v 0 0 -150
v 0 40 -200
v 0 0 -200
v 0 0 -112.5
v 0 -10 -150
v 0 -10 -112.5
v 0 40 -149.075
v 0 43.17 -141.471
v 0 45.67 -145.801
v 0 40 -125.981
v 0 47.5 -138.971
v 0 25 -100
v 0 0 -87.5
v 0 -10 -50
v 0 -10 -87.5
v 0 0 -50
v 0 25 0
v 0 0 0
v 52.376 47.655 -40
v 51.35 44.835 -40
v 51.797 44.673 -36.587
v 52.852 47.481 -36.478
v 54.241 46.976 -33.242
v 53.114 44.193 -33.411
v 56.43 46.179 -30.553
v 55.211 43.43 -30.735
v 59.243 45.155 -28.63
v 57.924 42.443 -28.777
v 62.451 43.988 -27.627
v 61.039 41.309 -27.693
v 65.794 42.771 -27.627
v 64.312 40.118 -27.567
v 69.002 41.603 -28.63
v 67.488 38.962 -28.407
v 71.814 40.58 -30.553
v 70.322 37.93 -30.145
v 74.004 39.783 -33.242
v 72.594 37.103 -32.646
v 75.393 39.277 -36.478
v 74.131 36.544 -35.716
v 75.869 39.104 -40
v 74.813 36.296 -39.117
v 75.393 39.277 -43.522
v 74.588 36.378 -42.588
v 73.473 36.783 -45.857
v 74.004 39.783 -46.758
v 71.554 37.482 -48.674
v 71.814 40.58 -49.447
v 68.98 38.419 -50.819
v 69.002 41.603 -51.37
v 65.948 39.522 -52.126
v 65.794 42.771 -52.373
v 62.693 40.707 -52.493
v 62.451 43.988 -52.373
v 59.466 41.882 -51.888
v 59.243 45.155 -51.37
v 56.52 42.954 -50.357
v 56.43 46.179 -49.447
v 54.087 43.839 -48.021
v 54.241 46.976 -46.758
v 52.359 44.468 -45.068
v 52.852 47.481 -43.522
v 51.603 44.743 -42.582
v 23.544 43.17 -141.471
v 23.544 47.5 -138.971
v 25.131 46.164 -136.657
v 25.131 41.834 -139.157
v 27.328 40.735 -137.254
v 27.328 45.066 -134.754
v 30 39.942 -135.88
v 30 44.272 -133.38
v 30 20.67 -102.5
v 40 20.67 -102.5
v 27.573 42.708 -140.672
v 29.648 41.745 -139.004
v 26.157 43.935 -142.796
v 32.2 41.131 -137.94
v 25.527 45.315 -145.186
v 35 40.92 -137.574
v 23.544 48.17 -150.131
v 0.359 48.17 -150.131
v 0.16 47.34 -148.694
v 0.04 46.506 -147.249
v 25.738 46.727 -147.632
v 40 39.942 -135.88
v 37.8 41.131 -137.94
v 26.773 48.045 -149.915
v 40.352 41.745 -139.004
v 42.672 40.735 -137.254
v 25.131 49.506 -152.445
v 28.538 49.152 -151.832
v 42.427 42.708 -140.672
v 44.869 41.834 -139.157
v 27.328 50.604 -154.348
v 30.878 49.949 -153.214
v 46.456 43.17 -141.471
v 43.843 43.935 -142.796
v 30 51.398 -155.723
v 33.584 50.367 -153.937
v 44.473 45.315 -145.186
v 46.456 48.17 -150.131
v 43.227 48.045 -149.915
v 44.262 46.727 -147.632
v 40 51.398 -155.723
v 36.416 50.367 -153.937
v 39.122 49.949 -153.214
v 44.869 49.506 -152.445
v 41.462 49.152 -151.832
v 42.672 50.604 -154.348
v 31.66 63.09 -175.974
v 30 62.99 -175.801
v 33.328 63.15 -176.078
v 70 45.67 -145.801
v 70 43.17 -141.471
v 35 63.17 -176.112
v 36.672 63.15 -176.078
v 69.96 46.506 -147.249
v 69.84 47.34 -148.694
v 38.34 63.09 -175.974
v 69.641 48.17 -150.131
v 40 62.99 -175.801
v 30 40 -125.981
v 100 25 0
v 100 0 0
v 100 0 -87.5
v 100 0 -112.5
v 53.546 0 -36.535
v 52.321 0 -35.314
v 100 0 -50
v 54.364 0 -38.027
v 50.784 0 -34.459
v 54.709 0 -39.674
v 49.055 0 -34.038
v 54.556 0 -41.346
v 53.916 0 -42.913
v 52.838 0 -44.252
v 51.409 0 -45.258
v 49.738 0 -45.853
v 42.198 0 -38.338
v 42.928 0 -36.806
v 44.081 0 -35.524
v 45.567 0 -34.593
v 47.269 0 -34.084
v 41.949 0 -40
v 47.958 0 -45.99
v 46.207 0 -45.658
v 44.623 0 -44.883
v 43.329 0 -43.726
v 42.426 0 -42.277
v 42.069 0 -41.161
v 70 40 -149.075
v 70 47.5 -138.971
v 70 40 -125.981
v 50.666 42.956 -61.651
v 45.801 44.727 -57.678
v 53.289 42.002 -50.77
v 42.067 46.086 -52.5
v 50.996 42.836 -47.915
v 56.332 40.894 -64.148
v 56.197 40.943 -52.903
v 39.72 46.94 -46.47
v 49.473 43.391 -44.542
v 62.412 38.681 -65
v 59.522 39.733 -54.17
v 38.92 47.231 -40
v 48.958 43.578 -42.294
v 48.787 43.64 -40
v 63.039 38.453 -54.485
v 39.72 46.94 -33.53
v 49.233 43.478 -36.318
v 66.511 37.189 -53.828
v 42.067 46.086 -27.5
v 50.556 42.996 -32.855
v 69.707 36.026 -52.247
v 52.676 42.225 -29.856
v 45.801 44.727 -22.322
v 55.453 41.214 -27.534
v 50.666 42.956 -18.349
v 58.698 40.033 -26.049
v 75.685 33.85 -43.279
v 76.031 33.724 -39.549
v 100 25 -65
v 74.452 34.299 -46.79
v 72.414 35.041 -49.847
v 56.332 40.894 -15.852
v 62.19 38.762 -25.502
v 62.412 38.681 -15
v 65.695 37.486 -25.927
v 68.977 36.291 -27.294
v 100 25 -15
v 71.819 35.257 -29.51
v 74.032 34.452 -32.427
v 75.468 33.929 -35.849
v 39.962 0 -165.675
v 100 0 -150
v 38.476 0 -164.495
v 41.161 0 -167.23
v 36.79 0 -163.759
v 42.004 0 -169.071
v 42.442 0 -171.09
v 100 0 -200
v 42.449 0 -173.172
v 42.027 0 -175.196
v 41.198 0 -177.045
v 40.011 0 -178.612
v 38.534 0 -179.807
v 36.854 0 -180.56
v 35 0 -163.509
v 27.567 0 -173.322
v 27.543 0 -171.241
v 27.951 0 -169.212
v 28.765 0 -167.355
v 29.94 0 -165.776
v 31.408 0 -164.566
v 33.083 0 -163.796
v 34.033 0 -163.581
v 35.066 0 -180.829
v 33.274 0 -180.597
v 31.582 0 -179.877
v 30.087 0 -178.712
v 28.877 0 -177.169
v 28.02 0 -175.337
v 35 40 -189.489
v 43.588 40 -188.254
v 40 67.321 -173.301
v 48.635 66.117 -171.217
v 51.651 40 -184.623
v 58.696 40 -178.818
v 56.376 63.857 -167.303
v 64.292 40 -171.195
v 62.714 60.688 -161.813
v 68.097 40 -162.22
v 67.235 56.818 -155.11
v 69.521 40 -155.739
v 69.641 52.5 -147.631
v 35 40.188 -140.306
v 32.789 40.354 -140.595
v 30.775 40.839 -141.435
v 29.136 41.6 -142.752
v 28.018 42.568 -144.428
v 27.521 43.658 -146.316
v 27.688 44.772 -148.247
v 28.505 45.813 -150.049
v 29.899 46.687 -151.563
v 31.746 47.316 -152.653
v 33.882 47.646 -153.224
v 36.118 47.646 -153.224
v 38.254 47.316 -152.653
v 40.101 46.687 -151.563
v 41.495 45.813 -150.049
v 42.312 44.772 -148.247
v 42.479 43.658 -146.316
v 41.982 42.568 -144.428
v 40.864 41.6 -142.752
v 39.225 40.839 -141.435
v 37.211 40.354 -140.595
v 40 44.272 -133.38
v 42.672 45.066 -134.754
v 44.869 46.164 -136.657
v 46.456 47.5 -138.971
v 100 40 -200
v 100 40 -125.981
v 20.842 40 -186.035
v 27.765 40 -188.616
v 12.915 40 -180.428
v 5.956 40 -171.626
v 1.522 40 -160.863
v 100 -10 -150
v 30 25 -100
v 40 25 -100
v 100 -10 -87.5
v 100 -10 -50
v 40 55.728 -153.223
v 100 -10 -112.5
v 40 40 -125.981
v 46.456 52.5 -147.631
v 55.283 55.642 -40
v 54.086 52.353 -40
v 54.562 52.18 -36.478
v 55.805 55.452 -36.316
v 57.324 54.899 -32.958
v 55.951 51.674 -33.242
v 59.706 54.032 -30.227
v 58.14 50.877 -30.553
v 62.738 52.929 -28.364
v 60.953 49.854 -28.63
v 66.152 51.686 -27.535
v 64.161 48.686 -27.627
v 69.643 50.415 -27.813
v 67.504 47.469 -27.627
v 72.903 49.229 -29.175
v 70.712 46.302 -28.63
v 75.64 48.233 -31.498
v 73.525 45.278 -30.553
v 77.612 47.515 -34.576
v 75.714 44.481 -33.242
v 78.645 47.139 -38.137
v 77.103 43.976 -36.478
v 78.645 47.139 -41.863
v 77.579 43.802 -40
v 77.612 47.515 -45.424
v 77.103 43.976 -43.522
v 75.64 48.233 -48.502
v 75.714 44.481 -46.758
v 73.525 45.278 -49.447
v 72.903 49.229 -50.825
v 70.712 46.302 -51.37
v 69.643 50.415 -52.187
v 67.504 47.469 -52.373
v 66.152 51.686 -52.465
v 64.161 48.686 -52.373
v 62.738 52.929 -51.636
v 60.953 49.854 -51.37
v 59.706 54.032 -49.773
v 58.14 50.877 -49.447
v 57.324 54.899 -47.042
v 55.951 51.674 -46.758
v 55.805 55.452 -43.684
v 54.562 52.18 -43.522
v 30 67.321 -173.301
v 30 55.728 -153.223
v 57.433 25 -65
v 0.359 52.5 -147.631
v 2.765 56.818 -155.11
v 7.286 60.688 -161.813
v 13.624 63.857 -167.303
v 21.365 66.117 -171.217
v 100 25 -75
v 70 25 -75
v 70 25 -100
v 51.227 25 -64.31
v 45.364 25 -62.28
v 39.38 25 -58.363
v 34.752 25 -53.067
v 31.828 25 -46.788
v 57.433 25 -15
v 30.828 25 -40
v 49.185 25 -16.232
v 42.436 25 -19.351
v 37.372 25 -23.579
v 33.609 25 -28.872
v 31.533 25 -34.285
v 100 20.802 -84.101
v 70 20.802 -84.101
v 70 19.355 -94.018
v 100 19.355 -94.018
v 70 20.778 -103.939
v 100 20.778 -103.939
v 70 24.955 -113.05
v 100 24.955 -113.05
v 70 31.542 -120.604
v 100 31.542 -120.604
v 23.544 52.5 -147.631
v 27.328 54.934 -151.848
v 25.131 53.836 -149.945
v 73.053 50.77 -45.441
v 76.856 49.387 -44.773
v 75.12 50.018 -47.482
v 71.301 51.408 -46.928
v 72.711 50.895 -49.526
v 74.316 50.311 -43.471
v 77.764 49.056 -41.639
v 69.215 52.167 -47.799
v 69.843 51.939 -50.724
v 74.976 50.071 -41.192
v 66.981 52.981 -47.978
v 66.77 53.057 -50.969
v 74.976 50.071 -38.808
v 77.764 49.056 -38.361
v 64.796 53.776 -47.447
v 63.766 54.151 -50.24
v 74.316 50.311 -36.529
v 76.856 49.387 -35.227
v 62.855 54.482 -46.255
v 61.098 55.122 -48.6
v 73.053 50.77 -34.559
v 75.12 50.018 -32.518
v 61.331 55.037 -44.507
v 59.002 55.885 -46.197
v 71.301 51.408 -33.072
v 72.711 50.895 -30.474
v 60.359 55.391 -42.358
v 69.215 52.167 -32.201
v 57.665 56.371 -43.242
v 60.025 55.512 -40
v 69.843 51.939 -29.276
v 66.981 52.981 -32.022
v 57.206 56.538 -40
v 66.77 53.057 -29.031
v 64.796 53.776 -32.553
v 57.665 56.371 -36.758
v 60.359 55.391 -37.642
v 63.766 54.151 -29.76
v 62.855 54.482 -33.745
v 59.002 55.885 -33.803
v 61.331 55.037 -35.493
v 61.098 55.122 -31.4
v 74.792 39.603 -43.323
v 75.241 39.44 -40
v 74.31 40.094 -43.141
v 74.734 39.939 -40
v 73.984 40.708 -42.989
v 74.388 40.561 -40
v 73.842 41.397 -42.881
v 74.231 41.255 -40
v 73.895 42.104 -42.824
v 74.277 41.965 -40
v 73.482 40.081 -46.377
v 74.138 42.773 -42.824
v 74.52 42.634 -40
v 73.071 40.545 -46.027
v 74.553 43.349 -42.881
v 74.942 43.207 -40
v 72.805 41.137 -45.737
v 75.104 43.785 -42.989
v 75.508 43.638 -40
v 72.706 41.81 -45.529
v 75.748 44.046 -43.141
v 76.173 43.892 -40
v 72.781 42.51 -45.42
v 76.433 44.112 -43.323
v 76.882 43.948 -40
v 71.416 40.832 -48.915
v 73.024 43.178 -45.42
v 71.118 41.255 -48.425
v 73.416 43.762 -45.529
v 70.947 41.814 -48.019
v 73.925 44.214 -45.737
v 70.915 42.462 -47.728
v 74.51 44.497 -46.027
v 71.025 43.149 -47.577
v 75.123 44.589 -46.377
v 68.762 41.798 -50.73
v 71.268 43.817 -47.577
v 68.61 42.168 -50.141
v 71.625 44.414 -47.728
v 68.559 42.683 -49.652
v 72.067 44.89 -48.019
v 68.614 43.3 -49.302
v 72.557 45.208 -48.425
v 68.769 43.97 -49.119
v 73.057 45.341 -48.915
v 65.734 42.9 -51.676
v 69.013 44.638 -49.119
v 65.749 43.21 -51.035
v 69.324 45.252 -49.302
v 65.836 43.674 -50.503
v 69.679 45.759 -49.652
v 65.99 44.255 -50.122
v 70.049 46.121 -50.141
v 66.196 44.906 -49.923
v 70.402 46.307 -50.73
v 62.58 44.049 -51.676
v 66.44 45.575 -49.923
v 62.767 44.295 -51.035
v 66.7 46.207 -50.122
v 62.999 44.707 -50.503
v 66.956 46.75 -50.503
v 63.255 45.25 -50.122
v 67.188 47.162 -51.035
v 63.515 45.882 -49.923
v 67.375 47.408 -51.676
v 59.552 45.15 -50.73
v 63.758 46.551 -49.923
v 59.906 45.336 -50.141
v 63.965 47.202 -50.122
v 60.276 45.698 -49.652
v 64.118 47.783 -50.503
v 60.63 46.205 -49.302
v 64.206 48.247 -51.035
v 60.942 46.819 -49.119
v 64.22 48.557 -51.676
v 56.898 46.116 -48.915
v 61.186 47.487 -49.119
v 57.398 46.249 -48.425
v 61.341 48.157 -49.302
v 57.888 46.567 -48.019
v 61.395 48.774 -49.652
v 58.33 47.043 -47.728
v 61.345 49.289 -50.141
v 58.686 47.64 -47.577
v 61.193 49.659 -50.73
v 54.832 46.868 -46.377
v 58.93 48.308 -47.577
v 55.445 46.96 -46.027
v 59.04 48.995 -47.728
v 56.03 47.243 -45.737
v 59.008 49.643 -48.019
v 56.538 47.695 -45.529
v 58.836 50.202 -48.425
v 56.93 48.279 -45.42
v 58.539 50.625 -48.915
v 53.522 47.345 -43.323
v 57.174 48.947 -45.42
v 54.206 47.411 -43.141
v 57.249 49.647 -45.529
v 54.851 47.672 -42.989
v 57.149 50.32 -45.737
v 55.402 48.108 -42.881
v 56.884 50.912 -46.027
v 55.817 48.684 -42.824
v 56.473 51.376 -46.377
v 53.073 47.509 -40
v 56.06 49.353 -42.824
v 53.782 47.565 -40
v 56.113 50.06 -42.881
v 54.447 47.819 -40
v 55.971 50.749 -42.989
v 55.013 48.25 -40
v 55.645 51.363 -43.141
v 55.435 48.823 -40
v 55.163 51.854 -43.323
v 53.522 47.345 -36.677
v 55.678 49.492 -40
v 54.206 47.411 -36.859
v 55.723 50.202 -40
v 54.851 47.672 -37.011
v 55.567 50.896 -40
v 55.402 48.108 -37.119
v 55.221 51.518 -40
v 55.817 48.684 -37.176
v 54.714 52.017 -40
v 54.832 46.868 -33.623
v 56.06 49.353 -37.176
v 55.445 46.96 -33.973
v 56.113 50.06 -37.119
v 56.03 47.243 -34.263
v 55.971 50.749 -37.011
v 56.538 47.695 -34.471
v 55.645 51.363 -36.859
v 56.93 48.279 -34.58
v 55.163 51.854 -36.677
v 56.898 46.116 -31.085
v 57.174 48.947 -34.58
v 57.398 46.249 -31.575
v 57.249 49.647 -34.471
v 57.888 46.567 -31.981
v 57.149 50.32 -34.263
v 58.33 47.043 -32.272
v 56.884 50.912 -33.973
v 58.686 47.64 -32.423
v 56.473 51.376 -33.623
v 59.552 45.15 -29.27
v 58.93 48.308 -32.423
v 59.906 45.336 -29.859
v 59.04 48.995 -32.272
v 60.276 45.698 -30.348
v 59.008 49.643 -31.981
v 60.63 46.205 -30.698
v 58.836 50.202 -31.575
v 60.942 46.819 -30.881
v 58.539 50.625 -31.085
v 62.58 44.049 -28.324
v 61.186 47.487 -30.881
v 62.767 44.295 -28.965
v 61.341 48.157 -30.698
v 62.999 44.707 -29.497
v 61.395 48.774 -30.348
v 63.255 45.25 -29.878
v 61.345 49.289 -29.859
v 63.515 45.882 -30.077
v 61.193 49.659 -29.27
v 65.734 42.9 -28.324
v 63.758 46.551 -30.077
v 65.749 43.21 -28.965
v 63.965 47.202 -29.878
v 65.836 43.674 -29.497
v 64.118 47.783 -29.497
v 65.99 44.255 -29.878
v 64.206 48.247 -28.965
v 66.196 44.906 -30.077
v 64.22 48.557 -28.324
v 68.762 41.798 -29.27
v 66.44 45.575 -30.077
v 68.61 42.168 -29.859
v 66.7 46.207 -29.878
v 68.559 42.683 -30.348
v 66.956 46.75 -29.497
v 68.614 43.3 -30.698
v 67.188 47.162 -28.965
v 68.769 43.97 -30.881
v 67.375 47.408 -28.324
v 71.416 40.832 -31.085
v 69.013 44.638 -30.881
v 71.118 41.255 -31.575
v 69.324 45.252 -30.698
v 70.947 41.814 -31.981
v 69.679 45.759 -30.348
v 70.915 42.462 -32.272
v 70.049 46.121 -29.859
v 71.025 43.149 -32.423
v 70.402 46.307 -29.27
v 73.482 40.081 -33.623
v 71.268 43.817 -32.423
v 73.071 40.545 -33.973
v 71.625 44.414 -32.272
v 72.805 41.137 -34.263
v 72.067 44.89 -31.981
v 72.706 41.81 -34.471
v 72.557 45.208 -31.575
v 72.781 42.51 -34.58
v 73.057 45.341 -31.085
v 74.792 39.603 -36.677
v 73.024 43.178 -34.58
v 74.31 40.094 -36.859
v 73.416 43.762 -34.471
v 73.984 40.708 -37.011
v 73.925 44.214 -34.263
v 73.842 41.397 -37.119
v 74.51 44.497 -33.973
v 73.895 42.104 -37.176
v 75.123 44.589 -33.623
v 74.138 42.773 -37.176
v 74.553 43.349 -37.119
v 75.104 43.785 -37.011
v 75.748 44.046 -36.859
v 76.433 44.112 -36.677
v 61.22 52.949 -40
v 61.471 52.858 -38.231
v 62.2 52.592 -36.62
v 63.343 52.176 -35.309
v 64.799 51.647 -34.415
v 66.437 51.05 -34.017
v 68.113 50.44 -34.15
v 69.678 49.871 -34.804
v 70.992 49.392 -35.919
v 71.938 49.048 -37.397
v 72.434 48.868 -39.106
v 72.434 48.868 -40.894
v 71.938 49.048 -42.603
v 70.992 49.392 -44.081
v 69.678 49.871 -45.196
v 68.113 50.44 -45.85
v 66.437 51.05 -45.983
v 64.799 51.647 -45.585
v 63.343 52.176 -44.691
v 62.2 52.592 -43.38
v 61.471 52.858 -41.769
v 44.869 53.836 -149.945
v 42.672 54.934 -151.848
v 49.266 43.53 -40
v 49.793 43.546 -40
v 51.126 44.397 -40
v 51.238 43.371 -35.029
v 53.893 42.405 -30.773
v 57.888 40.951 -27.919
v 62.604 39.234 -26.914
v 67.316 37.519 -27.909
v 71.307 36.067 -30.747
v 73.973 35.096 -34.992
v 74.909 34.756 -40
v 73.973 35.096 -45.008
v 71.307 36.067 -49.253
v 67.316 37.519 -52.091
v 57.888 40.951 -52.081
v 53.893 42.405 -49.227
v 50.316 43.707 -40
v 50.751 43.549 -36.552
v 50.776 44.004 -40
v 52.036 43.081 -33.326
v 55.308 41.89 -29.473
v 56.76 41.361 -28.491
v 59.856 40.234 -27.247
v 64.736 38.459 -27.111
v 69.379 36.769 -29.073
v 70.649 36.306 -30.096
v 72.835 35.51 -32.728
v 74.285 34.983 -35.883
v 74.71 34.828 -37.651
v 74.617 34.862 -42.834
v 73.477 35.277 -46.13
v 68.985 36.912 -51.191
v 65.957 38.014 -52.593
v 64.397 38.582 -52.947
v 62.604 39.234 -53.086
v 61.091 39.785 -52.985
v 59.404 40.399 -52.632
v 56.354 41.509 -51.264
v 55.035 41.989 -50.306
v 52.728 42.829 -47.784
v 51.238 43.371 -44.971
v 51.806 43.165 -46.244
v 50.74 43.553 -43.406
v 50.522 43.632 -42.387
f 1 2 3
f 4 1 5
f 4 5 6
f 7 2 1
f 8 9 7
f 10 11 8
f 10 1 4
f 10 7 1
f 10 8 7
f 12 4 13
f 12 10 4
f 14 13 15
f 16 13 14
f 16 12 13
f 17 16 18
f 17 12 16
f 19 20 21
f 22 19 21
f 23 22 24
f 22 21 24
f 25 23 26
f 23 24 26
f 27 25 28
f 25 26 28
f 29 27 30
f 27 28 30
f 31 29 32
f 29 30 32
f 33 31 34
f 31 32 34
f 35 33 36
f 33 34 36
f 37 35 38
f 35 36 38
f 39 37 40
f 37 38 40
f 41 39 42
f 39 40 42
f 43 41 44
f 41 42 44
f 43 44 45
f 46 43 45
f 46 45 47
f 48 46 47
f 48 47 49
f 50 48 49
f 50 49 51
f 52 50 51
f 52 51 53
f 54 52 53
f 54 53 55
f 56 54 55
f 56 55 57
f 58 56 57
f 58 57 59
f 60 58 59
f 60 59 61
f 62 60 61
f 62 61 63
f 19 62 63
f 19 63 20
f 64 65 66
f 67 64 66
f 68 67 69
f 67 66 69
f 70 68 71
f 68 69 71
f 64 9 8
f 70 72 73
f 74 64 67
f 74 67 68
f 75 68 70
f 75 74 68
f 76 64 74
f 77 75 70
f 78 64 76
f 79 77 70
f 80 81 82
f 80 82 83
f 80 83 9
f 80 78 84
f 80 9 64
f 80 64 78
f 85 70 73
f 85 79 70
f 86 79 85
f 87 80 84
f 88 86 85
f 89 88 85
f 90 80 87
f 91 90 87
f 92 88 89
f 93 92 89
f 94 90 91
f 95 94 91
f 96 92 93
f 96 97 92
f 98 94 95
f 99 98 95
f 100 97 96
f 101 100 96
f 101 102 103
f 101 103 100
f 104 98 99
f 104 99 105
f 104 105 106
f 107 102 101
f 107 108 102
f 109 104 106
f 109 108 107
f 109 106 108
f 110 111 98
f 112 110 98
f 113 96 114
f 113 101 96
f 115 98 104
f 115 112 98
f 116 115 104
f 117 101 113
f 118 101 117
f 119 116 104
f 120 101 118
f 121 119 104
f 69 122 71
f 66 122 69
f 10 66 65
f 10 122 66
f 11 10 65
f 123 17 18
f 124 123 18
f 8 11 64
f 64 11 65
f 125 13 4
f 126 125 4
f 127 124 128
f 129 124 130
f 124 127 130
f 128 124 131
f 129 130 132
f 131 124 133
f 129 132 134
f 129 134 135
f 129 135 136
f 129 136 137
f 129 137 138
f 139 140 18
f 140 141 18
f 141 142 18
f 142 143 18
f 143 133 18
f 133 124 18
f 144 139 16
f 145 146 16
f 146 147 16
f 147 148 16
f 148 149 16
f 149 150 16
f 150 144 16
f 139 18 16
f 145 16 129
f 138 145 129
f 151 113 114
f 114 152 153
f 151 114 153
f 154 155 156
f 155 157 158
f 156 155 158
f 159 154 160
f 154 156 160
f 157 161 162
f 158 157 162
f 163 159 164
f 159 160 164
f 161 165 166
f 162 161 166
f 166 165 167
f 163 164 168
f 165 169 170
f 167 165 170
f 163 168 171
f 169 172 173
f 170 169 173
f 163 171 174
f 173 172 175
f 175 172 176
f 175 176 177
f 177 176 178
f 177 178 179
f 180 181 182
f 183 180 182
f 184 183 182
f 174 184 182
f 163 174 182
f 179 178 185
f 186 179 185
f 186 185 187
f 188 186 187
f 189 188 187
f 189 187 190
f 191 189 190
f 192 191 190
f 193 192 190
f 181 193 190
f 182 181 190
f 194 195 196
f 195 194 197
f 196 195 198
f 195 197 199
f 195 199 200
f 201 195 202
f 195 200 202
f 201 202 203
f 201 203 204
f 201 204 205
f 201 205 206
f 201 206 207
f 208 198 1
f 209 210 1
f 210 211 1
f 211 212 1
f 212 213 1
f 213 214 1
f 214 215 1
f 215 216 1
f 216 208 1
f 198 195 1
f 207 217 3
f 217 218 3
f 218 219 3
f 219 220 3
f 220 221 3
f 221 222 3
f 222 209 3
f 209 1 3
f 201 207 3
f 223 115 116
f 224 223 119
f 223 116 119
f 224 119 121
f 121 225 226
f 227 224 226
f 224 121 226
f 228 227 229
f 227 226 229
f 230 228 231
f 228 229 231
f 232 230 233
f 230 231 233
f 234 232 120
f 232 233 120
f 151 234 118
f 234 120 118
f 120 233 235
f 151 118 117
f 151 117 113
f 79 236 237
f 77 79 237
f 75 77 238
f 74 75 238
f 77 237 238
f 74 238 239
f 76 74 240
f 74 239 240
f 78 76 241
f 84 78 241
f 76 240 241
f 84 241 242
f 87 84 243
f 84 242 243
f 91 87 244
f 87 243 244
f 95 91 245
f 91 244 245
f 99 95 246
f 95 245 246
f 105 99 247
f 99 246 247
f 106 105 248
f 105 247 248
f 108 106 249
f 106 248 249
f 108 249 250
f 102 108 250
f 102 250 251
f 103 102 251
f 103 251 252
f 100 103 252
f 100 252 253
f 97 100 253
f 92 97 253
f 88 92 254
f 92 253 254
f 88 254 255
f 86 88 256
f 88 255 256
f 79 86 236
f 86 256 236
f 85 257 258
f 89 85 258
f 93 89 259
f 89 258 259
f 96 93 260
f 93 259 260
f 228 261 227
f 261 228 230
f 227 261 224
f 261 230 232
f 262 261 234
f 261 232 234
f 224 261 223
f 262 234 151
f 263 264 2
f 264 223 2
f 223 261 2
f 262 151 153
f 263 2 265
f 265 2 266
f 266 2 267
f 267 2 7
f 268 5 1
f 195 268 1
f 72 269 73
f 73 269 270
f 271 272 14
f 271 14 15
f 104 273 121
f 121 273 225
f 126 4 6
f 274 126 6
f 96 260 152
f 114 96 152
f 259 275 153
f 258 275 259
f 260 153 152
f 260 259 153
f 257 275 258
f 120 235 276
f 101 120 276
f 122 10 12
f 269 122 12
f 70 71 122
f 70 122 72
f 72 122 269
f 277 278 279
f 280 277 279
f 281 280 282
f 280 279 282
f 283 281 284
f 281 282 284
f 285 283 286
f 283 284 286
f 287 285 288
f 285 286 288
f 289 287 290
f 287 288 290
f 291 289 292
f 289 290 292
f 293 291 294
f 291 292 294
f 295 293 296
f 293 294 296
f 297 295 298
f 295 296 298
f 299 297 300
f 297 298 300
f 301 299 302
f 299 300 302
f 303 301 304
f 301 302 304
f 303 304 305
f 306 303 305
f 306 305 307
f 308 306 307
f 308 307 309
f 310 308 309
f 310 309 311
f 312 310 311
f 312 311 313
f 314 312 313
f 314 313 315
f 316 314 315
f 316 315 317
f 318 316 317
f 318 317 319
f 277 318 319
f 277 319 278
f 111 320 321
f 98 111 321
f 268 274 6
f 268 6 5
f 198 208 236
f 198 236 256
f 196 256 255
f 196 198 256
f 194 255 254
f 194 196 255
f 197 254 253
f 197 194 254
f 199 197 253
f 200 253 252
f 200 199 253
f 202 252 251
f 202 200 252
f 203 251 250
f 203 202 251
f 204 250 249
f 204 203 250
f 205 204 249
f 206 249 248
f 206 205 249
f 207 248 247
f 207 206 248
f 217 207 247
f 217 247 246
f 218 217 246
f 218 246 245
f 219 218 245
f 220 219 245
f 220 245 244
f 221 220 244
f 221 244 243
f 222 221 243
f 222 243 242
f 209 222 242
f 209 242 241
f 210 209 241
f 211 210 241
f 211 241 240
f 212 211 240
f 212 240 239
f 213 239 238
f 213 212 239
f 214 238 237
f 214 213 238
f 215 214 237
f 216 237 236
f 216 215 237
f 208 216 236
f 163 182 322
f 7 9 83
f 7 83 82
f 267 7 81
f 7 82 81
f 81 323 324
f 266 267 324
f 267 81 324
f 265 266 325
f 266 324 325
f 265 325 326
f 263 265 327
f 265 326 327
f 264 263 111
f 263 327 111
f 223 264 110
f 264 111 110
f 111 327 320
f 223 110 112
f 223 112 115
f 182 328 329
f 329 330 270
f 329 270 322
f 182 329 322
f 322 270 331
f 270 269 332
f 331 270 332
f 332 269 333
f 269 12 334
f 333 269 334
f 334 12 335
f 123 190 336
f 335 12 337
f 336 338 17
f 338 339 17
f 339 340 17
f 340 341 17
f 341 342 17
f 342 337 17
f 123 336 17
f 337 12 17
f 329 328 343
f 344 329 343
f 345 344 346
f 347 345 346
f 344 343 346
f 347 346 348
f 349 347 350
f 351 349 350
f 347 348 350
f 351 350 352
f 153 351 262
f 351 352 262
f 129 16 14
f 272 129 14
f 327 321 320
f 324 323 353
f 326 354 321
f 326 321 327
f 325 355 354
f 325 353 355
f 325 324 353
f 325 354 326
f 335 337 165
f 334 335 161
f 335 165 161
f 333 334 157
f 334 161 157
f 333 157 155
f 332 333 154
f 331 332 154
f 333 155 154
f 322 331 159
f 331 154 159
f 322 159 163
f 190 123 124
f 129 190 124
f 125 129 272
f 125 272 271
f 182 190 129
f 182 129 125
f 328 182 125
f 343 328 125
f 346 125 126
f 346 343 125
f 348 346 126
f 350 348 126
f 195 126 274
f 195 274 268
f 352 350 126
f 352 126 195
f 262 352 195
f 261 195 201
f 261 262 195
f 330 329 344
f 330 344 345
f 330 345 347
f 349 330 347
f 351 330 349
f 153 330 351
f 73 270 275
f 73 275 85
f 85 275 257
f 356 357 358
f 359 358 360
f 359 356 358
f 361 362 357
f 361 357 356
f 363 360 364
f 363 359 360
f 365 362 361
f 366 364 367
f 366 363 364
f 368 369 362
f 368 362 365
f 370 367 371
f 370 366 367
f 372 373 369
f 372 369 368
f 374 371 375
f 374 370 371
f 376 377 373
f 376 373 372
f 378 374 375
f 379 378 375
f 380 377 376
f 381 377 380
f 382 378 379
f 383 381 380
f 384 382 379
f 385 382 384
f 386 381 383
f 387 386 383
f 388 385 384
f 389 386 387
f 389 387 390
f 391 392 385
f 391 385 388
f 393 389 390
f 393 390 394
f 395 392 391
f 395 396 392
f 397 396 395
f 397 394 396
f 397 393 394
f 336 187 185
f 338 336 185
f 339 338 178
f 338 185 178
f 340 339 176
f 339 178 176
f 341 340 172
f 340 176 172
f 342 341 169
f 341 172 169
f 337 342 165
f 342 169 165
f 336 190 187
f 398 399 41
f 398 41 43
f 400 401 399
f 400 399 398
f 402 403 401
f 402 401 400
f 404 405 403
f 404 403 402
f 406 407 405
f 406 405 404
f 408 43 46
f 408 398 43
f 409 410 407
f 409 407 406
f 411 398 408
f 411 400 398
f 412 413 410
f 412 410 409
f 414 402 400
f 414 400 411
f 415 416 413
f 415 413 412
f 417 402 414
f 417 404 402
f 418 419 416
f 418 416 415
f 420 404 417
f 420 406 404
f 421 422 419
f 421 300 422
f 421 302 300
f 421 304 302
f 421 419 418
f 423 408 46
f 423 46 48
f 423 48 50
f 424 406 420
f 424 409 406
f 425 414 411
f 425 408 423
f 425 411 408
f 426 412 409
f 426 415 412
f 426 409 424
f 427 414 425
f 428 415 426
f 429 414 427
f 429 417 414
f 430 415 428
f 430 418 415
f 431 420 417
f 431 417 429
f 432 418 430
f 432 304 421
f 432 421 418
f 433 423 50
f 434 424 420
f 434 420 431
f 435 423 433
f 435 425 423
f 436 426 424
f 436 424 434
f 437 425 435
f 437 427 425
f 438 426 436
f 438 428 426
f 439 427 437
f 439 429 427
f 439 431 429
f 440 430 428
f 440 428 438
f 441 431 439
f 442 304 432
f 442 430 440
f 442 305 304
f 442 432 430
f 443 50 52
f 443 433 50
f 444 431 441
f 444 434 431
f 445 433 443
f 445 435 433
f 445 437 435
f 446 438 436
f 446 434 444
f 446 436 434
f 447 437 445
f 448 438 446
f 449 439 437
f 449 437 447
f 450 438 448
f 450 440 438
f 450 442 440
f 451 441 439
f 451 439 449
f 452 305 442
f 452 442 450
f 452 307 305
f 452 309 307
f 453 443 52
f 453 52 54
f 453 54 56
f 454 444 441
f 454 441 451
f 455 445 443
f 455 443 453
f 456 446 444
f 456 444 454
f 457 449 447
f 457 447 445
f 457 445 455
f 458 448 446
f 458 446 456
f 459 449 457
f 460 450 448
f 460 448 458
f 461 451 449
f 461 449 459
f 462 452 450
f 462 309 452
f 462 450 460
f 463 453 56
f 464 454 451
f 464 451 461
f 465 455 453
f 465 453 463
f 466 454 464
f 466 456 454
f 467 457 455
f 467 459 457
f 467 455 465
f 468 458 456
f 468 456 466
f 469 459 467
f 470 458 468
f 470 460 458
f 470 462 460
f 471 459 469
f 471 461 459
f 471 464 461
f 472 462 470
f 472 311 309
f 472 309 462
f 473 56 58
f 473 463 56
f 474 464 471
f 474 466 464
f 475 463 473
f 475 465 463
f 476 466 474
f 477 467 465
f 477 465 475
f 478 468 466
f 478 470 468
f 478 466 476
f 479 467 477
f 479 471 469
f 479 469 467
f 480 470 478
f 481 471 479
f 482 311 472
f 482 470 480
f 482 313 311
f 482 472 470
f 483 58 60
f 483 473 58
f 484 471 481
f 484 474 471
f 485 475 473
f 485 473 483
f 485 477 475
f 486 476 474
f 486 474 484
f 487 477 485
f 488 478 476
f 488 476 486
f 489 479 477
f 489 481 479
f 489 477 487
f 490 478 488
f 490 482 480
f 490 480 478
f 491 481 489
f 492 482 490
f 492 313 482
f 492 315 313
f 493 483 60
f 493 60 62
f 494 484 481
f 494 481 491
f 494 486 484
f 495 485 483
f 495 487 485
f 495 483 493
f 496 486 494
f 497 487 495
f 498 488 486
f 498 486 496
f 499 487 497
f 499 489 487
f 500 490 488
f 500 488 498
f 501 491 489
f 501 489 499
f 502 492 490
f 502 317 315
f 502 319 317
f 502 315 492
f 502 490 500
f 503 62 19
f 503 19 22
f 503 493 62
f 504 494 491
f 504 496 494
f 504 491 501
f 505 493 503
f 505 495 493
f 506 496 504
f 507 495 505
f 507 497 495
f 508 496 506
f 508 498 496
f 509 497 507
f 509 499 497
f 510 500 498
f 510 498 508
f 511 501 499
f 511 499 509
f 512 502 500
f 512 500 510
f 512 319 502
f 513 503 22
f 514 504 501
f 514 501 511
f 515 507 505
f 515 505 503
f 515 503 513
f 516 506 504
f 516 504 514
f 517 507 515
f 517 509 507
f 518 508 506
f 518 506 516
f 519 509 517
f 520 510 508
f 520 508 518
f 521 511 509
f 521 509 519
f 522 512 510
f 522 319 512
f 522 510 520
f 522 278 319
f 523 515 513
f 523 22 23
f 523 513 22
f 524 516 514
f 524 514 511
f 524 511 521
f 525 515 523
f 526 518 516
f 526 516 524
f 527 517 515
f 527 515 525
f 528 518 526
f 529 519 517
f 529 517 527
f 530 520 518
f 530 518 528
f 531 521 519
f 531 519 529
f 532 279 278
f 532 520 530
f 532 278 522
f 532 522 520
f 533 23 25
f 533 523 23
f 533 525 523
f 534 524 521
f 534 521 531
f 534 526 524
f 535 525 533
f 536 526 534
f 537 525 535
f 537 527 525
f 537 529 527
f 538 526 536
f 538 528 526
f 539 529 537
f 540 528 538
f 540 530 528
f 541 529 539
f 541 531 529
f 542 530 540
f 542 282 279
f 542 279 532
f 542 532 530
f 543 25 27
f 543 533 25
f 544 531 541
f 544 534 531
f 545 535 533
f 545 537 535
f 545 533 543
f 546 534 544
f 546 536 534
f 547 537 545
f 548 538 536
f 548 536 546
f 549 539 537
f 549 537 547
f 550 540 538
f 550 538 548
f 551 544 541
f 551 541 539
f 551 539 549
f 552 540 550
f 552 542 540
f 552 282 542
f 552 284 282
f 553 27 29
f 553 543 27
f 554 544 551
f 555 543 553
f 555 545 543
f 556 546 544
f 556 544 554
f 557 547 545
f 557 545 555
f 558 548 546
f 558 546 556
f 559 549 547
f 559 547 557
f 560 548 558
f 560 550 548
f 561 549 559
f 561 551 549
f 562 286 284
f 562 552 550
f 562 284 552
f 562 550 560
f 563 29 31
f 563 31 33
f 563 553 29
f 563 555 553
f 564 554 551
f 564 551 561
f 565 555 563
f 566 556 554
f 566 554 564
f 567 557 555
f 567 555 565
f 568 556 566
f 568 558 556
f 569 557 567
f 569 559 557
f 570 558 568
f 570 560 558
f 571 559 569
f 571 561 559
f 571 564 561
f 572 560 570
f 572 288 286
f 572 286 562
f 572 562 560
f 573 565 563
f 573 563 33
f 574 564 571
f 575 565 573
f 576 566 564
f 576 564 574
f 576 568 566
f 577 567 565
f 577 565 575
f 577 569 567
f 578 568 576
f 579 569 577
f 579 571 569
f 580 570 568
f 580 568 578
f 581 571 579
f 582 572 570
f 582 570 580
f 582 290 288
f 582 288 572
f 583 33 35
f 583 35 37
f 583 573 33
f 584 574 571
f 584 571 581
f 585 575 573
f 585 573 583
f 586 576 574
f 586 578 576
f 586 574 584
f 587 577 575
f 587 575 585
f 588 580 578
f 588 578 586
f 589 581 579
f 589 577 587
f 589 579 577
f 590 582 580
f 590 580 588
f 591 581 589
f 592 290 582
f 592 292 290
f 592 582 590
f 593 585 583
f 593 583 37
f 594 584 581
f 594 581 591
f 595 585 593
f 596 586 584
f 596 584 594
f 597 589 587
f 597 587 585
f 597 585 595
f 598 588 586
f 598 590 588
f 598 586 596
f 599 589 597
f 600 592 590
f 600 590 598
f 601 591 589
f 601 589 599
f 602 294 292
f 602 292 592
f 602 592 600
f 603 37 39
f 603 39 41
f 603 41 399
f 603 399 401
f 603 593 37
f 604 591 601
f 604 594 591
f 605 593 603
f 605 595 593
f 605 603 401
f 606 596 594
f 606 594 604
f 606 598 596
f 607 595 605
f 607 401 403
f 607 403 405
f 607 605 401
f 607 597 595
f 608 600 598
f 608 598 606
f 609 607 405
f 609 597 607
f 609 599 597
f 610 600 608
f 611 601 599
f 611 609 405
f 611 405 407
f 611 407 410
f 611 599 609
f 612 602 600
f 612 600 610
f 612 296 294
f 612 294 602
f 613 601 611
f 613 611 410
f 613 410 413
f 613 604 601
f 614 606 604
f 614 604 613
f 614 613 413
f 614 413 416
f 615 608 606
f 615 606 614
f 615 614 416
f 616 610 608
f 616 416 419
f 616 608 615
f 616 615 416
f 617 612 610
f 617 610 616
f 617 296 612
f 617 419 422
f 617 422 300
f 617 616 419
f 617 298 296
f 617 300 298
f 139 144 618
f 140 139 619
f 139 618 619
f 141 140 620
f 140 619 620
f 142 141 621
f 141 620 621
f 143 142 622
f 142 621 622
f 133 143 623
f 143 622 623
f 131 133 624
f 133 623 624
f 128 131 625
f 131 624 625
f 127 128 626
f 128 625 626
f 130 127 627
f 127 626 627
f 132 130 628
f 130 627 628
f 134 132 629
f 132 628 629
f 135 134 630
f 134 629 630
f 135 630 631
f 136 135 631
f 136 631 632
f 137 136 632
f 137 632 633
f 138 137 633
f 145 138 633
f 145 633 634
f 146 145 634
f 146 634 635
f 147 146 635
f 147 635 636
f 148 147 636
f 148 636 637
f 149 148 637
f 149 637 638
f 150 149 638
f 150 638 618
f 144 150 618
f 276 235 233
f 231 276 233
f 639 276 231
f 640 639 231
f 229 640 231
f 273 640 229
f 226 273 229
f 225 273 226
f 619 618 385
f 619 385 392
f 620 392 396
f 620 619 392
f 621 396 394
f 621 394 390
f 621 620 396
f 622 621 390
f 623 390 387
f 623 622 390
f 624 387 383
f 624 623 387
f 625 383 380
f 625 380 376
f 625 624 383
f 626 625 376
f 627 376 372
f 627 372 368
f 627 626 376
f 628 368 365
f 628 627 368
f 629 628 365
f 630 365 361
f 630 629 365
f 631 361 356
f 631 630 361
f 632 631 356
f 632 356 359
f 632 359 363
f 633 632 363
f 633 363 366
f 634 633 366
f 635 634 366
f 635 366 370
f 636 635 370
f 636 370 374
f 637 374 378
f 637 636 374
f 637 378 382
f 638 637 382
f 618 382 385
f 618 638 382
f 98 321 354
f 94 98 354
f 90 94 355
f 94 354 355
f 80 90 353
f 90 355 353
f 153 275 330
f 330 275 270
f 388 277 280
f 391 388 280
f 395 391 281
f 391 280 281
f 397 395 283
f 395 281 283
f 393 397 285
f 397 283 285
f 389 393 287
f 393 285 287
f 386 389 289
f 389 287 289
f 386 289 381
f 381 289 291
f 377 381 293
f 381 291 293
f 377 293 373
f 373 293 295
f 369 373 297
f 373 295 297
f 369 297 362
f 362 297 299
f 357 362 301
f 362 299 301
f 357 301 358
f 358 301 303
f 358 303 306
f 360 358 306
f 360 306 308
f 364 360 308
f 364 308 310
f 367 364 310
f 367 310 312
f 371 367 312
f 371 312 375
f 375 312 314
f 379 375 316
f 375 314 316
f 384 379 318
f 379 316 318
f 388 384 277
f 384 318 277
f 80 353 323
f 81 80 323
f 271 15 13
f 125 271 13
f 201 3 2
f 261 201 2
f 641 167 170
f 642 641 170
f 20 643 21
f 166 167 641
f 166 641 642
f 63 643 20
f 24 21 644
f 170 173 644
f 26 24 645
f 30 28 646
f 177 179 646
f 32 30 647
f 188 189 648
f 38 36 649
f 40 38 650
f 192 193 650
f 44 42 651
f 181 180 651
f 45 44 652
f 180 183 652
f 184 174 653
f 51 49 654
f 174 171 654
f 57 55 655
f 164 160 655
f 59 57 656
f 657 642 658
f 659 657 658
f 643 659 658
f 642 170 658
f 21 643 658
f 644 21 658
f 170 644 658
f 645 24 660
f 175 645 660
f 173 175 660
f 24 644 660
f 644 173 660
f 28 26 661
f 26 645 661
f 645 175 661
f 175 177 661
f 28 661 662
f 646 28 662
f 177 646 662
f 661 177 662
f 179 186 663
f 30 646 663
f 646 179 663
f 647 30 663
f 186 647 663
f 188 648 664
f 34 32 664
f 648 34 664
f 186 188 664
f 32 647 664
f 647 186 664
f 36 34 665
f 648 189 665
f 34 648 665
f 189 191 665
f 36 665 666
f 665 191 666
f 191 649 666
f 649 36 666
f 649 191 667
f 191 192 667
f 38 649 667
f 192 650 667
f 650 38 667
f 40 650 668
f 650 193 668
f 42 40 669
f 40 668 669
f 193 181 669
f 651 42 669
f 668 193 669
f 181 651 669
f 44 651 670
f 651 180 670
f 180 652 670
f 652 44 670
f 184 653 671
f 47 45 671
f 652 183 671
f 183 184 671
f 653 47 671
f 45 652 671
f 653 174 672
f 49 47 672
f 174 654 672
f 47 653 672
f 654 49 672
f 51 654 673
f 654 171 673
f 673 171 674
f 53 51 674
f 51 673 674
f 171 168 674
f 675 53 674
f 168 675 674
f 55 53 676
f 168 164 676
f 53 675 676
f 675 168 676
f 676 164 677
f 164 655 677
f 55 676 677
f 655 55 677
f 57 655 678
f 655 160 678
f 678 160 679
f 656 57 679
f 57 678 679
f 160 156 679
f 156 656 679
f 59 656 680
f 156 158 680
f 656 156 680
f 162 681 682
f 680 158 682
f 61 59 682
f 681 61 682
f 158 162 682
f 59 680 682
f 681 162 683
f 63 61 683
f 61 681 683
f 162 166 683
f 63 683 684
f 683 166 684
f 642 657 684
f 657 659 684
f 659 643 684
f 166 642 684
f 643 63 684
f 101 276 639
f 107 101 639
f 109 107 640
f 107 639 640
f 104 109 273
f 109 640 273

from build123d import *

# Parameters (mm, degrees)
BOSS_EXTRUDE1_DEPTH     = 100
CUT_EXTRUDE1_DEPTH      = 30
BOSS_EXTRUDE2_START     = -15
BOSS_EXTRUDE2_DEPTH     = 50
CUT_EXTRUDE2_REACH      = 226.87
SKETCH5_R               = 12.5
BOSS_EXTRUDE4_DEPTH     = 15
SKETCH7_R               = 6
CUT_EXTRUDE4_DEPTH      = 228.547988513
FILLET1_R               = 2
CHAMFER1_SIZE           = 2
CHAMFER2_SIZE           = 1.5
BOSS_EXTRUDE5_DEPTH     = 70
CUT_EXTRUDE5_REACH      = 232.227
CUT_EXTRUDE6_DEPTH      = 5
CUT_EXTRUDE7_DEPTH      = 230.919504684
CUT_EXTRUDE7_DEPTH_BACK = 230.919504684
SKETCH17_R              = 7.5
CHAMFER3_SIZE           = 2


with BuildPart() as part:
    # Sketch1 → Boss-Extrude1 (new body)
    with BuildSketch(Plane(origin=(0, 0, 0), x_dir=(0, 0, -1), z_dir=(1, 0, 0))):
        Polygon((0, 0), (50, 0), (50, -10), (87.5, -10), (87.5, 0), (112.5, 0), (112.5, -10), (150, -10), (150, 0), (200, 0), (200, 40), (125.980762114, 40), (100, 25), (0, 25), align=None)
    extrude(amount=BOSS_EXTRUDE1_DEPTH)

    # Sketch2 → Cut-Extrude1 (cut)
    with BuildSketch(Plane(origin=(100, 0, 0), x_dir=(0, 0, -1), z_dir=(1, 0, 0))):
        with BuildLine():
            Line((100, 25), (75, 25))
            ThreePointArc((75, 25), (103.939266476, 20.77821286), (125.980762114, 40))
            Line((125.980762114, 40), (100, 25))
        make_face()
    extrude(amount=-CUT_EXTRUDE1_DEPTH, mode=Mode.SUBTRACT)

    # Sketch3 → Boss-Extrude2 (add)
    with BuildSketch(Plane.XY.offset(BOSS_EXTRUDE2_START)):
        Polygon((100, 25), (30.828444789, 25), (38.919979649, 47.231309316), align=None)
    extrude(amount=-BOSS_EXTRUDE2_DEPTH)

    # Cut-Extrude2: up to this plane
    cut_extrude2_end = Plane(origin=(100, 25, 0), z_dir=(0, -1, 0))
    # Sketch4 → Cut-Extrude2 (cut, up to the surface)
    with BuildSketch(Plane(origin=(19.732622965, 54.214936023, 0), x_dir=(0.9396926207859106, -0.3420201433256628, 0), z_dir=(0.34202014332566283, 0.9396926207859106, 0)), mode=Mode.PRIVATE) as cut_extrude2_sk1:
        with BuildLine():
            ThreePointArc((20.418758495, 40), (27.741088966, 57.67766953), (45.418758495, 65))
            Line((45.418758495, 65), (20.418758495, 65))
            Line((20.418758495, 65), (20.418758495, 40))
        make_face()
    cut_extrude2_tool1 = split(extrude(cut_extrude2_sk1.sketch, amount=-CUT_EXTRUDE2_REACH, mode=Mode.PRIVATE), bisect_by=cut_extrude2_end, keep=Keep.BOTH, mode=Mode.PRIVATE)
    add(cut_extrude2_tool1.solids().sort_by_distance((44.16741, 45.321401, -59.415802))[0], mode=Mode.SUBTRACT)
    # Sketch4 → Cut-Extrude2 (cut, up to the surface)
    with BuildSketch(Plane(origin=(19.732622965, 54.214936023, 0), x_dir=(0.9396926207859106, -0.3420201433256628, 0), z_dir=(0.34202014332566283, 0.9396926207859106, 0)), mode=Mode.PRIVATE) as cut_extrude2_sk2:
        with BuildLine():
            ThreePointArc((45.418758495, 15), (27.741088966, 22.32233047), (20.418758495, 40))
            Line((20.418758495, 40), (20.418758495, 15))
            Line((20.418758495, 15), (45.418758495, 15))
        make_face()
    cut_extrude2_tool2 = split(extrude(cut_extrude2_sk2.sketch, amount=-CUT_EXTRUDE2_REACH, mode=Mode.PRIVATE), bisect_by=cut_extrude2_end, keep=Keep.BOTH, mode=Mode.PRIVATE)
    add(cut_extrude2_tool2.solids().sort_by_distance((44.16741, 45.321401, -20.584198))[0], mode=Mode.SUBTRACT)

    # Sketch5 → Boss-Extrude4 (add)
    with BuildSketch(Plane(origin=(19.732622965, 54.214936023, 0), x_dir=(0.9396926207859106, -0.3420201433256628, 0), z_dir=(0.34202014332566283, 0.9396926207859106, 0))):
        with Locations(Location((45.418758495, 40, 0), (0, 0, 180))):
            Circle(SKETCH5_R)
    extrude(amount=BOSS_EXTRUDE4_DEPTH)

    # Sketch7 → Cut-Extrude4 (cut, through all)
    with BuildSketch(Plane(origin=(24.862925115, 68.310325335, 0), x_dir=(0.9396926207859105, -0.3420201433256629, 0), z_dir=(0.34202014332566294, 0.9396926207859106, 0))):
        with Locations(Location((45.418758495, 40, 0), (0, 0, 180))):
            Circle(SKETCH7_R)
    extrude(amount=-CUT_EXTRUDE4_DEPTH, mode=Mode.SUBTRACT)

    # Fillet1
    fillet1_edges = [part.edges().sort_by_distance(p)[0] for p in [
        (74.158452928, 34.405553941, -40),
    ]]
    fillet(fillet1_edges, radius=FILLET1_R)

    # Chamfer1
    chamfer1_edges = [part.edges().sort_by_distance(p)[0] for p in [
        (73.180753043, 50.724074185, -40),
    ]]
    chamfer(chamfer1_edges, length=CHAMFER1_SIZE)

    # Sketch11 → Cut-Revolve1 (revolve, cut)
    with BuildSketch(Plane(origin=(42.679672203, -15.53413029, 0), x_dir=(0.34202014332566294, 0.9396926207859105, 0), z_dir=(0.9396926207859105, -0.342020143325663, 0)), mode=Mode.PRIVATE) as cut_revolve1_sk:
        with BuildLine():
            Line((67.694329852, -27.5), (62.694329852, -27.5))
            ThreePointArc((62.694329852, -27.5), (65.194329852, -30), (67.694329852, -27.5))
        make_face()
    revolve(cut_revolve1_sk.sketch.rotate(Axis((43.396560119, -13.564496931, -40), (0.34202014332566283, 0.9396926207859105, 0)), 90), axis=Axis((43.396560119, -13.564496931, -40), (0.34202014332566283, 0.9396926207859105, 0)), mode=Mode.SUBTRACT)

    # Chamfer2
    chamfer2_edges = [part.edges().sort_by_distance(p)[0] for p in [
        (79.288755078, 48.500943253, -40),
    ]]
    chamfer(chamfer2_edges, length=CHAMFER2_SIZE)

    # Sketch13 → Boss-Extrude5 (add)
    with BuildSketch(Plane.ZY):
        Polygon((-125.980762114, 40), (-173.612159322, 67.5), (-189.489291724, 40), align=None)
    extrude(amount=-BOSS_EXTRUDE5_DEPTH)

    # Cut-Extrude5: up to this plane
    cut_extrude5_end = Plane(origin=(100, 40, -200), z_dir=(0, -1, 0))
    # Sketch14 → Cut-Extrude5 (cut, up to the surface)
    with BuildSketch(Plane(origin=(0, -24.551270189, -14.174682453), x_dir=(1, 0, 0), z_dir=(0, 0.8660254037844378, 0.5000000000000016)), mode=Mode.PRIVATE) as cut_extrude5_sk1:
        with BuildLine():
            Line((70, 184.102540378), (35, 184.102540378))
            ThreePointArc((35, 184.102540378), (59.748737342, 173.85127772), (70, 149.102540378))
            Line((70, 149.102540378), (70, 184.102540378))
        make_face()
    cut_extrude5_tool1 = split(extrude(cut_extrude5_sk1.sketch, amount=-CUT_EXTRUDE5_REACH, mode=Mode.PRIVATE), bisect_by=cut_extrude5_end, keep=Keep.BOTH, mode=Mode.PRIVATE)
    add(cut_extrude5_tool1.solids().sort_by_distance((62.182122, 63.591061, -166.841678))[0], mode=Mode.SUBTRACT)
    # Sketch14 → Cut-Extrude5 (cut, up to the surface)
    with BuildSketch(Plane(origin=(0, -24.551270189, -14.174682453), x_dir=(1, 0, 0), z_dir=(0, 0.8660254037844378, 0.5000000000000016)), mode=Mode.PRIVATE) as cut_extrude5_sk2:
        with BuildLine():
            Line((0, 184.102540378), (0, 149.102540378))
            ThreePointArc((0, 149.102540378), (10.251262658, 173.85127772), (35, 184.102540378))
            Line((35, 184.102540378), (0, 184.102540378))
        make_face()
    cut_extrude5_tool2 = split(extrude(cut_extrude5_sk2.sketch, amount=-CUT_EXTRUDE5_REACH, mode=Mode.PRIVATE), bisect_by=cut_extrude5_end, keep=Keep.BOTH, mode=Mode.PRIVATE)
    add(cut_extrude5_tool2.solids().sort_by_distance((7.817878, 63.591061, -166.841678))[0], mode=Mode.SUBTRACT)

    # Sketch15 → Cut-Extrude6 (cut)
    with BuildSketch(Plane(origin=(0, -24.551270189, -14.174682453), x_dir=(1, 0, 0), z_dir=(0, 0.8660254037844378, 0.5000000000000016))):
        with BuildLine():
            ThreePointArc((40, 183.74355653), (35, 184.102540378), (30, 183.74355653))
            Line((30, 183.74355653), (30, 160.558979616))
            ThreePointArc((30, 160.558979616), (26.161165235, 157.941375143), (23.543560763, 154.102540378))
            Line((23.543560763, 154.102540378), (0.358983849, 154.102540378))
            ThreePointArc((0.358983849, 154.102540378), (0.08986132, 151.608975566), (0, 149.102540378))
            Line((0, 149.102540378), (0, 144.102540378))
            Line((0, 144.102540378), (23.543560763, 144.102540378))
            ThreePointArc((23.543560763, 144.102540378), (26.161165235, 140.263705614), (30, 137.646101141))
            Line((30, 137.646101141), (30, 99.102540378))
            Line((30, 99.102540378), (40, 99.102540378))
            Line((40, 99.102540378), (40, 137.646101141))
            ThreePointArc((40, 137.646101141), (43.838834765, 140.263705614), (46.456439237, 144.102540378))
            Line((46.456439237, 144.102540378), (70, 144.102540378))
            Line((70, 144.102540378), (70, 149.102540378))
            ThreePointArc((70, 149.102540378), (69.91013868, 151.608975566), (69.641016151, 154.102540378))
            Line((69.641016151, 154.102540378), (46.456439237, 154.102540378))
            ThreePointArc((46.456439237, 154.102540378), (43.838834765, 157.941375143), (40, 160.558979616))
            Line((40, 160.558979616), (40, 183.74355653))
        make_face()
    extrude(amount=-CUT_EXTRUDE6_DEPTH, mode=Mode.SUBTRACT)

    # Sketch17 → Cut-Extrude7 (cut, two sides: drawn at the far end of the back side and taken through both)
    with BuildSketch(Plane(origin=(0, -28.881397208, -16.674682453), x_dir=(1, 0, 0), z_dir=(0, 0.8660254037844378, 0.5000000000000016)).offset(-CUT_EXTRUDE7_DEPTH_BACK)):
        with Locations(Location((35, 149.102540378, 0), (0, 0, 270))):
            Circle(SKETCH17_R)
    extrude(amount=CUT_EXTRUDE7_DEPTH + CUT_EXTRUDE7_DEPTH_BACK, mode=Mode.SUBTRACT)

    # Chamfer3
    chamfer3_edges = [part.edges().sort_by_distance(p)[0] for p in [
        (35, 49.419872981, -152.296460718),
    ]]
    chamfer(chamfer3_edges, length=CHAMFER3_SIZE)


solid = part.part
